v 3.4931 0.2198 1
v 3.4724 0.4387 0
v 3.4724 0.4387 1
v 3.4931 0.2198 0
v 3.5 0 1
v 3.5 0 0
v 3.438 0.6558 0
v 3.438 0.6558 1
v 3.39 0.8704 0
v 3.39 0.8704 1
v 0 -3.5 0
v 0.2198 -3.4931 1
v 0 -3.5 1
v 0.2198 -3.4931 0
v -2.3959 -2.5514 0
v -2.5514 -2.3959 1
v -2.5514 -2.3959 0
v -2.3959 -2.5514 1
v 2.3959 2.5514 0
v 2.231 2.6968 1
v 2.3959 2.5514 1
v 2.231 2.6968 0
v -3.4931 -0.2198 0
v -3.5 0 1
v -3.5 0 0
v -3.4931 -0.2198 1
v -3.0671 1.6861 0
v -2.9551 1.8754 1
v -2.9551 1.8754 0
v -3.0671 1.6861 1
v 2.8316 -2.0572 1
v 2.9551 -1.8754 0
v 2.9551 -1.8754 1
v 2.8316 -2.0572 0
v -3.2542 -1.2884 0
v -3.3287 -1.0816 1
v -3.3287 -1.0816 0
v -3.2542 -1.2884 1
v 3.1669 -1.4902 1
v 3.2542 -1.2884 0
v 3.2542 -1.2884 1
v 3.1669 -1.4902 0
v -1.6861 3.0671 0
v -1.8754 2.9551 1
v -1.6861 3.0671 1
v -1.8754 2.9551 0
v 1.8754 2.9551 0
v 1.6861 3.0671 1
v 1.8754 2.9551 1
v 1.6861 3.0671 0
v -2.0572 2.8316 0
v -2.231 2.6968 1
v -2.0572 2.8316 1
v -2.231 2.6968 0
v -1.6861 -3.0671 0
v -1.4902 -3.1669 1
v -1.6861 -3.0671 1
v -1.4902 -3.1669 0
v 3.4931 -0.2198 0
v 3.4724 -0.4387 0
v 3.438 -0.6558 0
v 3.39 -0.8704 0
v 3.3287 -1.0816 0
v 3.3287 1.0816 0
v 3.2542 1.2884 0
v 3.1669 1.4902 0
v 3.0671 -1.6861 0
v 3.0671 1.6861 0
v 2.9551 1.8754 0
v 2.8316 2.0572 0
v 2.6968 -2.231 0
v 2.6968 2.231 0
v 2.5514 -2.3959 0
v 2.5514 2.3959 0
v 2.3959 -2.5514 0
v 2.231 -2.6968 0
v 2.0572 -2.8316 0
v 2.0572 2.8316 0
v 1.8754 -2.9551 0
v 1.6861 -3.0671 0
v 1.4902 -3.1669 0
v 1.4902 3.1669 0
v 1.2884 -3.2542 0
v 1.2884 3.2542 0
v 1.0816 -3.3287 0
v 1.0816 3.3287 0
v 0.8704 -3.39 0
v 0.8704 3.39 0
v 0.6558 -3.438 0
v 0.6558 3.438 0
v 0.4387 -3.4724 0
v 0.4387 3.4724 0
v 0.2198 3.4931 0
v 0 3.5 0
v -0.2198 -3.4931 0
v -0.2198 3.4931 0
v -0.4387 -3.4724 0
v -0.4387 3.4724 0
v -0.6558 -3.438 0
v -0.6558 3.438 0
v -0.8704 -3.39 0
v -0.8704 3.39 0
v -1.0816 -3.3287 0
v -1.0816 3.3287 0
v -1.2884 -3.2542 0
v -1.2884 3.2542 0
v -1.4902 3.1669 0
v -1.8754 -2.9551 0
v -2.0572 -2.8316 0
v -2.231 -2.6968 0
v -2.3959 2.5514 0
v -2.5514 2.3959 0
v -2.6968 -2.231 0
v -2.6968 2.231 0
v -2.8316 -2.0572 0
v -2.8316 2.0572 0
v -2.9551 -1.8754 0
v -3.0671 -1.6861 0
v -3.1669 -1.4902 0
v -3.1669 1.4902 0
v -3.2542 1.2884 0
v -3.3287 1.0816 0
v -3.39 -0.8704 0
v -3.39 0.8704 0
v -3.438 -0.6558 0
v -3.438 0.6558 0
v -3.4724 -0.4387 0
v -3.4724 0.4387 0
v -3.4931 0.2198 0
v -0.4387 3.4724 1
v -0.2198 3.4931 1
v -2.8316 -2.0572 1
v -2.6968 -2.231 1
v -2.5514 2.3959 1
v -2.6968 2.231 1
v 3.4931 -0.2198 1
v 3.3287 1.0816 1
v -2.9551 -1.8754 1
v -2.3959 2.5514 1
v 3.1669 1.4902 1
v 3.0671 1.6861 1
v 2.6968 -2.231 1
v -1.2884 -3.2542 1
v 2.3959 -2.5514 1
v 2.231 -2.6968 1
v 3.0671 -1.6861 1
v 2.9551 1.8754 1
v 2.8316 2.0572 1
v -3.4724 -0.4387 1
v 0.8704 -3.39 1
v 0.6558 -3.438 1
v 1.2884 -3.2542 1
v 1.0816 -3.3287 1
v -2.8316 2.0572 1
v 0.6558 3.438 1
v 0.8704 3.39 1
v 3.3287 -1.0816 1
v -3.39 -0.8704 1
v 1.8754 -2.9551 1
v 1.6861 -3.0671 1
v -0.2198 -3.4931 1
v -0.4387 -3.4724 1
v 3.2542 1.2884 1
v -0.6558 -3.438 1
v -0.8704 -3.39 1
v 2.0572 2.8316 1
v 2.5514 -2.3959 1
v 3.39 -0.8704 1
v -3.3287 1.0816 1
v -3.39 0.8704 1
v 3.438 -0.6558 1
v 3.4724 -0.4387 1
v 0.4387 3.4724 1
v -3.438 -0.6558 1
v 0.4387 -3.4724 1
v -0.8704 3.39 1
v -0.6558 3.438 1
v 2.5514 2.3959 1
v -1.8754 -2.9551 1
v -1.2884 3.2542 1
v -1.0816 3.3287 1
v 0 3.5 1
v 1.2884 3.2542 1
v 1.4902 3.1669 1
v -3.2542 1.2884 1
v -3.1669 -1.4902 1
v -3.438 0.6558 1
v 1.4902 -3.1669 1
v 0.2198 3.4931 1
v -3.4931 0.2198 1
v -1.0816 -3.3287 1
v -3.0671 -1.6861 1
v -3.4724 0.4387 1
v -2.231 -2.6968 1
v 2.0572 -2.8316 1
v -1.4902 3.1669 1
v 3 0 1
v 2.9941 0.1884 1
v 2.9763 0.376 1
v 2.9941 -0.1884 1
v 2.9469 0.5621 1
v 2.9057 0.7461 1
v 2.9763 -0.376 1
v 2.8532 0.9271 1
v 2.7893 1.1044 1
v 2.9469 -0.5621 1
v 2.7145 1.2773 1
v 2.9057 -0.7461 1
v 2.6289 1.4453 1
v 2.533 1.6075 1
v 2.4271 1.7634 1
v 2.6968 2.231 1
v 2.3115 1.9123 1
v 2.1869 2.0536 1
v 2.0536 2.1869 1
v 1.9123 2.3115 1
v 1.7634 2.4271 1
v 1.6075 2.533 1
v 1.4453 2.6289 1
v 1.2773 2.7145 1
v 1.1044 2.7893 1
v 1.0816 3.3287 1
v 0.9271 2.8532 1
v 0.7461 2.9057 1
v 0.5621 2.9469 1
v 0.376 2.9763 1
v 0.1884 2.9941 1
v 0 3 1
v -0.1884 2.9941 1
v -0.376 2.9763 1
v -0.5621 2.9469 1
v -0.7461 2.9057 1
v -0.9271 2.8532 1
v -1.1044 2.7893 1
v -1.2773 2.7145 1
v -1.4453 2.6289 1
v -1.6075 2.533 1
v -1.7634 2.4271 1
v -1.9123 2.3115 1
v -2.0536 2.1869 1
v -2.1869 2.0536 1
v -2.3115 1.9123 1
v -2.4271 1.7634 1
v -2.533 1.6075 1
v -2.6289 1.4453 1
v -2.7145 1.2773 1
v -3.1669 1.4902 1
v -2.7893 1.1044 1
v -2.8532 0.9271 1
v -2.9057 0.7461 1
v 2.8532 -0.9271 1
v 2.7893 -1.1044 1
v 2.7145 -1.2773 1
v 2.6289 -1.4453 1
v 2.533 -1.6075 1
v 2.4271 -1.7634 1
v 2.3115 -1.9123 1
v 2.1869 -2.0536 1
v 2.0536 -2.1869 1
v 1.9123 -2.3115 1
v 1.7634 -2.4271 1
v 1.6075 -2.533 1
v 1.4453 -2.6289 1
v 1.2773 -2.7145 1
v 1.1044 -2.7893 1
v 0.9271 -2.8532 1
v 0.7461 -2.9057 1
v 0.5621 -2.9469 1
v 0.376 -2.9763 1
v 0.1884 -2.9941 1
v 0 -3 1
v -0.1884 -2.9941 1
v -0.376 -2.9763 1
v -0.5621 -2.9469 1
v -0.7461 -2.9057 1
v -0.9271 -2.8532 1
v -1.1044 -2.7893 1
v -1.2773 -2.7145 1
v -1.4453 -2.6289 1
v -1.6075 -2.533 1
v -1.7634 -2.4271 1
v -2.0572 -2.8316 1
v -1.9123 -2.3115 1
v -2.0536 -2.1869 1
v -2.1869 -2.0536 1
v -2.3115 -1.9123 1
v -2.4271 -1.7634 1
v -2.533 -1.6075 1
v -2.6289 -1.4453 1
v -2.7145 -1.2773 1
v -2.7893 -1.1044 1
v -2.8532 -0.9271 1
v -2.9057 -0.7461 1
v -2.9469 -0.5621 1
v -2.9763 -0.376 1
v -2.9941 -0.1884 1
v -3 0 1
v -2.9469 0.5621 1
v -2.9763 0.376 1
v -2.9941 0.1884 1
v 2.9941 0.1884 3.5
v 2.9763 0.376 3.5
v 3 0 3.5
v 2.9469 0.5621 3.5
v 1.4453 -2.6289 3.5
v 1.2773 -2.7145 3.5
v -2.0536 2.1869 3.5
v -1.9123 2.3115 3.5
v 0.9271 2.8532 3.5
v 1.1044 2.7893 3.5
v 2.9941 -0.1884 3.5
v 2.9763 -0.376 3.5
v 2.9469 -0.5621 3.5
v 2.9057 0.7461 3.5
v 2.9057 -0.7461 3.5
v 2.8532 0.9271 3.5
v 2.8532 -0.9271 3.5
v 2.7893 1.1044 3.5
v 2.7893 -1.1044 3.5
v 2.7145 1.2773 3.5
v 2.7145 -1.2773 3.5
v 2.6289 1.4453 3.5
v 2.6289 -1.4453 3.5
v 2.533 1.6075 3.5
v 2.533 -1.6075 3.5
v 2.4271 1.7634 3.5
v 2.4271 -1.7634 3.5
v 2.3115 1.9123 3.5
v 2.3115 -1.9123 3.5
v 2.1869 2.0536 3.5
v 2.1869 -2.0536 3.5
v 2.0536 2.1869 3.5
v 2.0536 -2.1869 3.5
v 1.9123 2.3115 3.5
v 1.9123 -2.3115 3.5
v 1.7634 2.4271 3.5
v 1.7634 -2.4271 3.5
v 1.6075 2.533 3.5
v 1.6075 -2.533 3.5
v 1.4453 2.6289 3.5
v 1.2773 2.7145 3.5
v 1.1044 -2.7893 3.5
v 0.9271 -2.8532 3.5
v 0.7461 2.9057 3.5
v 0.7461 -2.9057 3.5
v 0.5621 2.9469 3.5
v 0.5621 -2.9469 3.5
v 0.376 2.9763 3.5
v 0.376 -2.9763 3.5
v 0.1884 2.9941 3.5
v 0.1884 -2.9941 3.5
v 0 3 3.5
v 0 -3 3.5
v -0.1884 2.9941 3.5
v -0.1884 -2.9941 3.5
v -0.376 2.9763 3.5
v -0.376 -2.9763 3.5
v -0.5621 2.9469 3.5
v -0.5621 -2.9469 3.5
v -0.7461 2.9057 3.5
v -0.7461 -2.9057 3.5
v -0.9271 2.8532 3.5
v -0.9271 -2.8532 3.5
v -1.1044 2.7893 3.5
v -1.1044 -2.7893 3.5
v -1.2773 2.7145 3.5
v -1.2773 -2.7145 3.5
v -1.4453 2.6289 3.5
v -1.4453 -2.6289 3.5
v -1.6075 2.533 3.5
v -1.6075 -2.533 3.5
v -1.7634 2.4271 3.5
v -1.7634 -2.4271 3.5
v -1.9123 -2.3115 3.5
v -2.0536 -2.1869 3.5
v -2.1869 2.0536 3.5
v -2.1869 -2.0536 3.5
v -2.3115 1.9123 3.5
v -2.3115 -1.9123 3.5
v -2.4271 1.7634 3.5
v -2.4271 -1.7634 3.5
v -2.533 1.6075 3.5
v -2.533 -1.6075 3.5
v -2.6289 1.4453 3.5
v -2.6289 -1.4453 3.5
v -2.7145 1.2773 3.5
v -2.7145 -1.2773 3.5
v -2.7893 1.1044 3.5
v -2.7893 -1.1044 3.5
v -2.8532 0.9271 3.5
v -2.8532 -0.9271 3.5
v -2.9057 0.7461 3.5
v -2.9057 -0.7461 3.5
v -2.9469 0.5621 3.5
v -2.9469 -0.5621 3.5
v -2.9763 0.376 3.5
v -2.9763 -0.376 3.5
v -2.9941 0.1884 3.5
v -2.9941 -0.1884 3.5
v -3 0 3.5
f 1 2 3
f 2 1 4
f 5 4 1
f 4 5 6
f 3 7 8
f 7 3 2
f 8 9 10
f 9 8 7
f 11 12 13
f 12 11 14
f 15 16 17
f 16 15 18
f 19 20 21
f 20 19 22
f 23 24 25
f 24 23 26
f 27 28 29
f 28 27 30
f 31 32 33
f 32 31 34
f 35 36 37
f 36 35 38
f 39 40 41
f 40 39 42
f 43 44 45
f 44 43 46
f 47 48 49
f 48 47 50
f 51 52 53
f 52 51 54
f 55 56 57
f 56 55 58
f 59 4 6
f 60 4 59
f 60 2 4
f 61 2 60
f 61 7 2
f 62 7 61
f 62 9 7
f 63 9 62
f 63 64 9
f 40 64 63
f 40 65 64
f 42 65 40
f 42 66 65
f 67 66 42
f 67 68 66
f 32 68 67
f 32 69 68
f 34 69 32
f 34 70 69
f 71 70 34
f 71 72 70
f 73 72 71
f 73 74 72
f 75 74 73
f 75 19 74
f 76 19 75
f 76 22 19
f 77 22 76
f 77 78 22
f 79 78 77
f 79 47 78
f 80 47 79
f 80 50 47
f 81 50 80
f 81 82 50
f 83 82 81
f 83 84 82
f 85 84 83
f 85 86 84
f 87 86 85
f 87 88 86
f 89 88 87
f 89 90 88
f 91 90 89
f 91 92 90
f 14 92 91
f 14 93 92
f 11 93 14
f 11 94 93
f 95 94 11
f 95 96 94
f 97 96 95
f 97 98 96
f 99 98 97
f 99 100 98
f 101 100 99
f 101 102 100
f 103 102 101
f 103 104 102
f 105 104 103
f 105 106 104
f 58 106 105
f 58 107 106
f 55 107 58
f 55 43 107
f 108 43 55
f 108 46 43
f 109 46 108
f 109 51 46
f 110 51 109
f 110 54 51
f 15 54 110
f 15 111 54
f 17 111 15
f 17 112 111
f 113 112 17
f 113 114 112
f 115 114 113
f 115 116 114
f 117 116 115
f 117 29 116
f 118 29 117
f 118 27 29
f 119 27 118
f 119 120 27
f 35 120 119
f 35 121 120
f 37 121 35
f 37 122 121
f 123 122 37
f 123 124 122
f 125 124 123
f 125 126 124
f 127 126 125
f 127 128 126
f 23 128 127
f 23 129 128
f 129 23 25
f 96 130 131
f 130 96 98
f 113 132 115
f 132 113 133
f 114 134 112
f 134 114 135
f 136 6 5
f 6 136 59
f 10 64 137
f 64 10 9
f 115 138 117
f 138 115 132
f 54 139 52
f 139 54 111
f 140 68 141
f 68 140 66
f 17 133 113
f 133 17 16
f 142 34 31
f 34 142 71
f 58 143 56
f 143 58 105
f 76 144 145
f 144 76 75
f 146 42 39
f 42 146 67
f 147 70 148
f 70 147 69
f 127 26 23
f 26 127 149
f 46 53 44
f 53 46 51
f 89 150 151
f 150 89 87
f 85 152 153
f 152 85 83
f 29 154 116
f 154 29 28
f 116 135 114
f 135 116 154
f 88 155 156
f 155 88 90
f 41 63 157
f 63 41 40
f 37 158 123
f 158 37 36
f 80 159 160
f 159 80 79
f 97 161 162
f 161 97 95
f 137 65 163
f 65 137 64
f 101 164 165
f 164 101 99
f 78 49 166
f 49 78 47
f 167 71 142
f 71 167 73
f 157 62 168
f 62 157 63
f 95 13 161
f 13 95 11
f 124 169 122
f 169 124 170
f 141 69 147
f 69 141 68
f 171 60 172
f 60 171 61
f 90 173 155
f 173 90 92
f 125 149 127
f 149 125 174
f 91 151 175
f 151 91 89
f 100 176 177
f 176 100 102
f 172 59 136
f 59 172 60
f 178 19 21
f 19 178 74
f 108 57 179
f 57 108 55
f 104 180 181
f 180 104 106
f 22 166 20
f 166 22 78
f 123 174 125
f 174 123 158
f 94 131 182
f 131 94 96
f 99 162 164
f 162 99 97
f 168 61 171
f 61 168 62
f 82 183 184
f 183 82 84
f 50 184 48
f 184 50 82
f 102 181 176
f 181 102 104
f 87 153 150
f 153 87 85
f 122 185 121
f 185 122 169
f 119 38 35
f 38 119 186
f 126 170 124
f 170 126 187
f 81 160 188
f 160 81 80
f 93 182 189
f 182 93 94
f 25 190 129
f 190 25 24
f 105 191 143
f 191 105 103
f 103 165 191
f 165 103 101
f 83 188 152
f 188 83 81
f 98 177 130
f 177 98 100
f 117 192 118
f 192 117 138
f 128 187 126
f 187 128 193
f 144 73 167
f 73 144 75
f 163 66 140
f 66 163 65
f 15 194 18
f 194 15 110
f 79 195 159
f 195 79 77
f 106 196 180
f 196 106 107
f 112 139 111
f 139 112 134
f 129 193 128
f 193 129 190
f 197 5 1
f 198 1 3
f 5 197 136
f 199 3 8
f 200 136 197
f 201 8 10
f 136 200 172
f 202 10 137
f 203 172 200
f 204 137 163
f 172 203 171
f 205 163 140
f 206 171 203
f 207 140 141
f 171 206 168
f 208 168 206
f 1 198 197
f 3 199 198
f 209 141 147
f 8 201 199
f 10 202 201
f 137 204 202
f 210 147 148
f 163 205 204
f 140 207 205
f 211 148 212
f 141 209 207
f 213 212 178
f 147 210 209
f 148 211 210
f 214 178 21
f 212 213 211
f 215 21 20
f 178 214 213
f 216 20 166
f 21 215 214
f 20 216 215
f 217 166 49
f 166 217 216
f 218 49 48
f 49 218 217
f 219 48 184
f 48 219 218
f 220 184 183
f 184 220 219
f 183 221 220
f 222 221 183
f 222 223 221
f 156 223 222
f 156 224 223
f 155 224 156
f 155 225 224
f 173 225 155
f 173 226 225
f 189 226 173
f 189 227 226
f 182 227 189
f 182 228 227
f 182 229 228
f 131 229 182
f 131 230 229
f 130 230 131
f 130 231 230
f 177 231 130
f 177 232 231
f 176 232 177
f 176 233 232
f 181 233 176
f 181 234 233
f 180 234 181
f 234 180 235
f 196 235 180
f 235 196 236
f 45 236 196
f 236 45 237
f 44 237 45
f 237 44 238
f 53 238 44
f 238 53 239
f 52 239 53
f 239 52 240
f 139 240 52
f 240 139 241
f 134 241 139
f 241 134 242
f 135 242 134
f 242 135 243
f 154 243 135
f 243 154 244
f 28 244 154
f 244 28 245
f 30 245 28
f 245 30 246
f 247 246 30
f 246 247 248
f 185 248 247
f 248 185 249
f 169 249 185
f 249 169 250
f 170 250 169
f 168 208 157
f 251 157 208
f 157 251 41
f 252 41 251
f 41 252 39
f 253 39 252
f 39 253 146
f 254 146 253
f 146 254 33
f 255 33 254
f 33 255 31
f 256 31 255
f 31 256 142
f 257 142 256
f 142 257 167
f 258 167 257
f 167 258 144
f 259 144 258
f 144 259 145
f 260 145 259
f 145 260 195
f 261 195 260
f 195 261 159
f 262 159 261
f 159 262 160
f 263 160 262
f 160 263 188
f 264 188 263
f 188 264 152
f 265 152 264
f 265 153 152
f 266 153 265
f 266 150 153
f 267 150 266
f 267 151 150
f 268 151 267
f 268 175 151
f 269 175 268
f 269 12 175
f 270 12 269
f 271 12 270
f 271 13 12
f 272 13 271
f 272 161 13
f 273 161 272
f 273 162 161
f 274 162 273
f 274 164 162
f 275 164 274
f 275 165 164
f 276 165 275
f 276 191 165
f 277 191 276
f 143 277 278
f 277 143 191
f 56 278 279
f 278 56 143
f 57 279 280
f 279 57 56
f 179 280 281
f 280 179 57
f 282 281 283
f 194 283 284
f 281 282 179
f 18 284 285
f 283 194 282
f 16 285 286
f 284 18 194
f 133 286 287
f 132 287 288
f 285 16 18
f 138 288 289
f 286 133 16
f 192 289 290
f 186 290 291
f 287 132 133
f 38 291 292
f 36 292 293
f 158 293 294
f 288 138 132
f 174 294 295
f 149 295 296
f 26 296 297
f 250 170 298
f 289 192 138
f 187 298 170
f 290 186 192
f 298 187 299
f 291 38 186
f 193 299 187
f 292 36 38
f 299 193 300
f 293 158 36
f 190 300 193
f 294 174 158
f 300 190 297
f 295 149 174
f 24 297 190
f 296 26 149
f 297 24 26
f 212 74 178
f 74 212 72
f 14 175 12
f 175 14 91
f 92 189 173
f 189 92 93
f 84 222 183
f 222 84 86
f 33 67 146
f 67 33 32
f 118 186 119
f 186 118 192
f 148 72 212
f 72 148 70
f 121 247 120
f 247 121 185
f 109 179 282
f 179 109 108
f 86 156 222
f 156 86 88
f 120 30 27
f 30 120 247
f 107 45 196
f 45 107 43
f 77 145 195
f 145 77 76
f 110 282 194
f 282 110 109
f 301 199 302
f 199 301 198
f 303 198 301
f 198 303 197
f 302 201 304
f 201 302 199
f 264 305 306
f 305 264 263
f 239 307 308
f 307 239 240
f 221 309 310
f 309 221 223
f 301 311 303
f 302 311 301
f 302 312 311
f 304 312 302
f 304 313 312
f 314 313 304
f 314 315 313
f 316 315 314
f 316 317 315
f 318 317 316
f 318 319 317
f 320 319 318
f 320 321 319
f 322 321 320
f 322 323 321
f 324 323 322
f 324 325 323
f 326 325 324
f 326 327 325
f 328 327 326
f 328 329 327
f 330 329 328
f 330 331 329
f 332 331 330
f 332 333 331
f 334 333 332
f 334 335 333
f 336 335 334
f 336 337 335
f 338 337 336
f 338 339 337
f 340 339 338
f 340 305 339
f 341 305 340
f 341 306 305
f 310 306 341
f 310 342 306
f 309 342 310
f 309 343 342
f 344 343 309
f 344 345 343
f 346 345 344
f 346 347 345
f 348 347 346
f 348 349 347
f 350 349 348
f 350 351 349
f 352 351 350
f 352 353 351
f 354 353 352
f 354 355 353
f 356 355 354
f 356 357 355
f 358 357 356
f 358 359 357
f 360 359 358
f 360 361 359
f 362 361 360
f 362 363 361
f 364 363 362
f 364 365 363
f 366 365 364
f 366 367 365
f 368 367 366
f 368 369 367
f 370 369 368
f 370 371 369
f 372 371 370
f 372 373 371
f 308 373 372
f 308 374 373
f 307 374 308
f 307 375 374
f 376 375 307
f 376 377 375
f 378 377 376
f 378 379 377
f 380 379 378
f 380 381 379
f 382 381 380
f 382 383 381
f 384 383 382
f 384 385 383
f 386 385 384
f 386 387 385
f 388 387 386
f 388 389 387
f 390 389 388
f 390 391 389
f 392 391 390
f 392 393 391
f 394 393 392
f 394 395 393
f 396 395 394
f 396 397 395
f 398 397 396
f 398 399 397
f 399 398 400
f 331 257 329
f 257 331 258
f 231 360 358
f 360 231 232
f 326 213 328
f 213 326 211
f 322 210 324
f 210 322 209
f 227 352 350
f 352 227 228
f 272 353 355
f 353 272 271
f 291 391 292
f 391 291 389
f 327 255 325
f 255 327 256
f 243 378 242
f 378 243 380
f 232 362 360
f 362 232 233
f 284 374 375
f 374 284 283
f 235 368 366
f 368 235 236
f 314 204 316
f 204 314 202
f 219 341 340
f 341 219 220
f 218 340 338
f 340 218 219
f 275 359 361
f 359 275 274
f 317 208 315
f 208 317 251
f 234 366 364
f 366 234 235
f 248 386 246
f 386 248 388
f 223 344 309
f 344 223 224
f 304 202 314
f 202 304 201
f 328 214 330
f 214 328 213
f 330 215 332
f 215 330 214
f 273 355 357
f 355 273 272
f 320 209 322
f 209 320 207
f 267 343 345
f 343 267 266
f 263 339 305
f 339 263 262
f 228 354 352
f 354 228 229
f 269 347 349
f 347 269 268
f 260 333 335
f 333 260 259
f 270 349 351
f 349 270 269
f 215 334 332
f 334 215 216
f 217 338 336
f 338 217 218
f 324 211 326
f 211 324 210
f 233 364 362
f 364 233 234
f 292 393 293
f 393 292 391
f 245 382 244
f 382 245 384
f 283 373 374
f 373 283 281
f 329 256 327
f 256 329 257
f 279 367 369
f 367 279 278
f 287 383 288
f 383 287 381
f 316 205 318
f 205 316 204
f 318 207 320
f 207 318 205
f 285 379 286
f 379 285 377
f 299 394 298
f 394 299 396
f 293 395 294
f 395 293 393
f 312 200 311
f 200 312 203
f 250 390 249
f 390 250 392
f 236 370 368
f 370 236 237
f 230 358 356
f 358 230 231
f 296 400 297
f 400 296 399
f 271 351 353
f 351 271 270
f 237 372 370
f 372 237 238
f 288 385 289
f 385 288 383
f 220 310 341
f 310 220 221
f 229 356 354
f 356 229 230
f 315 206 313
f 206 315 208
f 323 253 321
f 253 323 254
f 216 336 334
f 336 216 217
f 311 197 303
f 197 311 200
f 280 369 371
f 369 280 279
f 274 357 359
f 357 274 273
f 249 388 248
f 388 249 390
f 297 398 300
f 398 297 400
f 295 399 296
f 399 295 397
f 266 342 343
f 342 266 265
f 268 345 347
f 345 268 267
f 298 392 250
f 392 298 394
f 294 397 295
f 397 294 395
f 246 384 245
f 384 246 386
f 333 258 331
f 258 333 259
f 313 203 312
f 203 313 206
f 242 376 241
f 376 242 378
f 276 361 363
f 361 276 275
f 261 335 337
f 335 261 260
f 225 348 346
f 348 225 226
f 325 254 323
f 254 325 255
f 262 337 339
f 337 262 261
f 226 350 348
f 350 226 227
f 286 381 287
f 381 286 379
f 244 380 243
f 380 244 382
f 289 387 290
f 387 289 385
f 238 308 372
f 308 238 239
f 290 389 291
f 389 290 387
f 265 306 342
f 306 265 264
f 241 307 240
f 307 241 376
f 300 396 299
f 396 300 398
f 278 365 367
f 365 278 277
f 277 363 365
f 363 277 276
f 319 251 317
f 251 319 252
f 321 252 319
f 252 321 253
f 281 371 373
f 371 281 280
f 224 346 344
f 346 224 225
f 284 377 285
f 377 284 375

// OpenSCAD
$fn = 100;
wthikness = 1.5;

cylinder(r =3.5, h = 1);
translate([0, 0 ,1]) {
    cylinder(r = 3, h = wthikness + 1);
}
